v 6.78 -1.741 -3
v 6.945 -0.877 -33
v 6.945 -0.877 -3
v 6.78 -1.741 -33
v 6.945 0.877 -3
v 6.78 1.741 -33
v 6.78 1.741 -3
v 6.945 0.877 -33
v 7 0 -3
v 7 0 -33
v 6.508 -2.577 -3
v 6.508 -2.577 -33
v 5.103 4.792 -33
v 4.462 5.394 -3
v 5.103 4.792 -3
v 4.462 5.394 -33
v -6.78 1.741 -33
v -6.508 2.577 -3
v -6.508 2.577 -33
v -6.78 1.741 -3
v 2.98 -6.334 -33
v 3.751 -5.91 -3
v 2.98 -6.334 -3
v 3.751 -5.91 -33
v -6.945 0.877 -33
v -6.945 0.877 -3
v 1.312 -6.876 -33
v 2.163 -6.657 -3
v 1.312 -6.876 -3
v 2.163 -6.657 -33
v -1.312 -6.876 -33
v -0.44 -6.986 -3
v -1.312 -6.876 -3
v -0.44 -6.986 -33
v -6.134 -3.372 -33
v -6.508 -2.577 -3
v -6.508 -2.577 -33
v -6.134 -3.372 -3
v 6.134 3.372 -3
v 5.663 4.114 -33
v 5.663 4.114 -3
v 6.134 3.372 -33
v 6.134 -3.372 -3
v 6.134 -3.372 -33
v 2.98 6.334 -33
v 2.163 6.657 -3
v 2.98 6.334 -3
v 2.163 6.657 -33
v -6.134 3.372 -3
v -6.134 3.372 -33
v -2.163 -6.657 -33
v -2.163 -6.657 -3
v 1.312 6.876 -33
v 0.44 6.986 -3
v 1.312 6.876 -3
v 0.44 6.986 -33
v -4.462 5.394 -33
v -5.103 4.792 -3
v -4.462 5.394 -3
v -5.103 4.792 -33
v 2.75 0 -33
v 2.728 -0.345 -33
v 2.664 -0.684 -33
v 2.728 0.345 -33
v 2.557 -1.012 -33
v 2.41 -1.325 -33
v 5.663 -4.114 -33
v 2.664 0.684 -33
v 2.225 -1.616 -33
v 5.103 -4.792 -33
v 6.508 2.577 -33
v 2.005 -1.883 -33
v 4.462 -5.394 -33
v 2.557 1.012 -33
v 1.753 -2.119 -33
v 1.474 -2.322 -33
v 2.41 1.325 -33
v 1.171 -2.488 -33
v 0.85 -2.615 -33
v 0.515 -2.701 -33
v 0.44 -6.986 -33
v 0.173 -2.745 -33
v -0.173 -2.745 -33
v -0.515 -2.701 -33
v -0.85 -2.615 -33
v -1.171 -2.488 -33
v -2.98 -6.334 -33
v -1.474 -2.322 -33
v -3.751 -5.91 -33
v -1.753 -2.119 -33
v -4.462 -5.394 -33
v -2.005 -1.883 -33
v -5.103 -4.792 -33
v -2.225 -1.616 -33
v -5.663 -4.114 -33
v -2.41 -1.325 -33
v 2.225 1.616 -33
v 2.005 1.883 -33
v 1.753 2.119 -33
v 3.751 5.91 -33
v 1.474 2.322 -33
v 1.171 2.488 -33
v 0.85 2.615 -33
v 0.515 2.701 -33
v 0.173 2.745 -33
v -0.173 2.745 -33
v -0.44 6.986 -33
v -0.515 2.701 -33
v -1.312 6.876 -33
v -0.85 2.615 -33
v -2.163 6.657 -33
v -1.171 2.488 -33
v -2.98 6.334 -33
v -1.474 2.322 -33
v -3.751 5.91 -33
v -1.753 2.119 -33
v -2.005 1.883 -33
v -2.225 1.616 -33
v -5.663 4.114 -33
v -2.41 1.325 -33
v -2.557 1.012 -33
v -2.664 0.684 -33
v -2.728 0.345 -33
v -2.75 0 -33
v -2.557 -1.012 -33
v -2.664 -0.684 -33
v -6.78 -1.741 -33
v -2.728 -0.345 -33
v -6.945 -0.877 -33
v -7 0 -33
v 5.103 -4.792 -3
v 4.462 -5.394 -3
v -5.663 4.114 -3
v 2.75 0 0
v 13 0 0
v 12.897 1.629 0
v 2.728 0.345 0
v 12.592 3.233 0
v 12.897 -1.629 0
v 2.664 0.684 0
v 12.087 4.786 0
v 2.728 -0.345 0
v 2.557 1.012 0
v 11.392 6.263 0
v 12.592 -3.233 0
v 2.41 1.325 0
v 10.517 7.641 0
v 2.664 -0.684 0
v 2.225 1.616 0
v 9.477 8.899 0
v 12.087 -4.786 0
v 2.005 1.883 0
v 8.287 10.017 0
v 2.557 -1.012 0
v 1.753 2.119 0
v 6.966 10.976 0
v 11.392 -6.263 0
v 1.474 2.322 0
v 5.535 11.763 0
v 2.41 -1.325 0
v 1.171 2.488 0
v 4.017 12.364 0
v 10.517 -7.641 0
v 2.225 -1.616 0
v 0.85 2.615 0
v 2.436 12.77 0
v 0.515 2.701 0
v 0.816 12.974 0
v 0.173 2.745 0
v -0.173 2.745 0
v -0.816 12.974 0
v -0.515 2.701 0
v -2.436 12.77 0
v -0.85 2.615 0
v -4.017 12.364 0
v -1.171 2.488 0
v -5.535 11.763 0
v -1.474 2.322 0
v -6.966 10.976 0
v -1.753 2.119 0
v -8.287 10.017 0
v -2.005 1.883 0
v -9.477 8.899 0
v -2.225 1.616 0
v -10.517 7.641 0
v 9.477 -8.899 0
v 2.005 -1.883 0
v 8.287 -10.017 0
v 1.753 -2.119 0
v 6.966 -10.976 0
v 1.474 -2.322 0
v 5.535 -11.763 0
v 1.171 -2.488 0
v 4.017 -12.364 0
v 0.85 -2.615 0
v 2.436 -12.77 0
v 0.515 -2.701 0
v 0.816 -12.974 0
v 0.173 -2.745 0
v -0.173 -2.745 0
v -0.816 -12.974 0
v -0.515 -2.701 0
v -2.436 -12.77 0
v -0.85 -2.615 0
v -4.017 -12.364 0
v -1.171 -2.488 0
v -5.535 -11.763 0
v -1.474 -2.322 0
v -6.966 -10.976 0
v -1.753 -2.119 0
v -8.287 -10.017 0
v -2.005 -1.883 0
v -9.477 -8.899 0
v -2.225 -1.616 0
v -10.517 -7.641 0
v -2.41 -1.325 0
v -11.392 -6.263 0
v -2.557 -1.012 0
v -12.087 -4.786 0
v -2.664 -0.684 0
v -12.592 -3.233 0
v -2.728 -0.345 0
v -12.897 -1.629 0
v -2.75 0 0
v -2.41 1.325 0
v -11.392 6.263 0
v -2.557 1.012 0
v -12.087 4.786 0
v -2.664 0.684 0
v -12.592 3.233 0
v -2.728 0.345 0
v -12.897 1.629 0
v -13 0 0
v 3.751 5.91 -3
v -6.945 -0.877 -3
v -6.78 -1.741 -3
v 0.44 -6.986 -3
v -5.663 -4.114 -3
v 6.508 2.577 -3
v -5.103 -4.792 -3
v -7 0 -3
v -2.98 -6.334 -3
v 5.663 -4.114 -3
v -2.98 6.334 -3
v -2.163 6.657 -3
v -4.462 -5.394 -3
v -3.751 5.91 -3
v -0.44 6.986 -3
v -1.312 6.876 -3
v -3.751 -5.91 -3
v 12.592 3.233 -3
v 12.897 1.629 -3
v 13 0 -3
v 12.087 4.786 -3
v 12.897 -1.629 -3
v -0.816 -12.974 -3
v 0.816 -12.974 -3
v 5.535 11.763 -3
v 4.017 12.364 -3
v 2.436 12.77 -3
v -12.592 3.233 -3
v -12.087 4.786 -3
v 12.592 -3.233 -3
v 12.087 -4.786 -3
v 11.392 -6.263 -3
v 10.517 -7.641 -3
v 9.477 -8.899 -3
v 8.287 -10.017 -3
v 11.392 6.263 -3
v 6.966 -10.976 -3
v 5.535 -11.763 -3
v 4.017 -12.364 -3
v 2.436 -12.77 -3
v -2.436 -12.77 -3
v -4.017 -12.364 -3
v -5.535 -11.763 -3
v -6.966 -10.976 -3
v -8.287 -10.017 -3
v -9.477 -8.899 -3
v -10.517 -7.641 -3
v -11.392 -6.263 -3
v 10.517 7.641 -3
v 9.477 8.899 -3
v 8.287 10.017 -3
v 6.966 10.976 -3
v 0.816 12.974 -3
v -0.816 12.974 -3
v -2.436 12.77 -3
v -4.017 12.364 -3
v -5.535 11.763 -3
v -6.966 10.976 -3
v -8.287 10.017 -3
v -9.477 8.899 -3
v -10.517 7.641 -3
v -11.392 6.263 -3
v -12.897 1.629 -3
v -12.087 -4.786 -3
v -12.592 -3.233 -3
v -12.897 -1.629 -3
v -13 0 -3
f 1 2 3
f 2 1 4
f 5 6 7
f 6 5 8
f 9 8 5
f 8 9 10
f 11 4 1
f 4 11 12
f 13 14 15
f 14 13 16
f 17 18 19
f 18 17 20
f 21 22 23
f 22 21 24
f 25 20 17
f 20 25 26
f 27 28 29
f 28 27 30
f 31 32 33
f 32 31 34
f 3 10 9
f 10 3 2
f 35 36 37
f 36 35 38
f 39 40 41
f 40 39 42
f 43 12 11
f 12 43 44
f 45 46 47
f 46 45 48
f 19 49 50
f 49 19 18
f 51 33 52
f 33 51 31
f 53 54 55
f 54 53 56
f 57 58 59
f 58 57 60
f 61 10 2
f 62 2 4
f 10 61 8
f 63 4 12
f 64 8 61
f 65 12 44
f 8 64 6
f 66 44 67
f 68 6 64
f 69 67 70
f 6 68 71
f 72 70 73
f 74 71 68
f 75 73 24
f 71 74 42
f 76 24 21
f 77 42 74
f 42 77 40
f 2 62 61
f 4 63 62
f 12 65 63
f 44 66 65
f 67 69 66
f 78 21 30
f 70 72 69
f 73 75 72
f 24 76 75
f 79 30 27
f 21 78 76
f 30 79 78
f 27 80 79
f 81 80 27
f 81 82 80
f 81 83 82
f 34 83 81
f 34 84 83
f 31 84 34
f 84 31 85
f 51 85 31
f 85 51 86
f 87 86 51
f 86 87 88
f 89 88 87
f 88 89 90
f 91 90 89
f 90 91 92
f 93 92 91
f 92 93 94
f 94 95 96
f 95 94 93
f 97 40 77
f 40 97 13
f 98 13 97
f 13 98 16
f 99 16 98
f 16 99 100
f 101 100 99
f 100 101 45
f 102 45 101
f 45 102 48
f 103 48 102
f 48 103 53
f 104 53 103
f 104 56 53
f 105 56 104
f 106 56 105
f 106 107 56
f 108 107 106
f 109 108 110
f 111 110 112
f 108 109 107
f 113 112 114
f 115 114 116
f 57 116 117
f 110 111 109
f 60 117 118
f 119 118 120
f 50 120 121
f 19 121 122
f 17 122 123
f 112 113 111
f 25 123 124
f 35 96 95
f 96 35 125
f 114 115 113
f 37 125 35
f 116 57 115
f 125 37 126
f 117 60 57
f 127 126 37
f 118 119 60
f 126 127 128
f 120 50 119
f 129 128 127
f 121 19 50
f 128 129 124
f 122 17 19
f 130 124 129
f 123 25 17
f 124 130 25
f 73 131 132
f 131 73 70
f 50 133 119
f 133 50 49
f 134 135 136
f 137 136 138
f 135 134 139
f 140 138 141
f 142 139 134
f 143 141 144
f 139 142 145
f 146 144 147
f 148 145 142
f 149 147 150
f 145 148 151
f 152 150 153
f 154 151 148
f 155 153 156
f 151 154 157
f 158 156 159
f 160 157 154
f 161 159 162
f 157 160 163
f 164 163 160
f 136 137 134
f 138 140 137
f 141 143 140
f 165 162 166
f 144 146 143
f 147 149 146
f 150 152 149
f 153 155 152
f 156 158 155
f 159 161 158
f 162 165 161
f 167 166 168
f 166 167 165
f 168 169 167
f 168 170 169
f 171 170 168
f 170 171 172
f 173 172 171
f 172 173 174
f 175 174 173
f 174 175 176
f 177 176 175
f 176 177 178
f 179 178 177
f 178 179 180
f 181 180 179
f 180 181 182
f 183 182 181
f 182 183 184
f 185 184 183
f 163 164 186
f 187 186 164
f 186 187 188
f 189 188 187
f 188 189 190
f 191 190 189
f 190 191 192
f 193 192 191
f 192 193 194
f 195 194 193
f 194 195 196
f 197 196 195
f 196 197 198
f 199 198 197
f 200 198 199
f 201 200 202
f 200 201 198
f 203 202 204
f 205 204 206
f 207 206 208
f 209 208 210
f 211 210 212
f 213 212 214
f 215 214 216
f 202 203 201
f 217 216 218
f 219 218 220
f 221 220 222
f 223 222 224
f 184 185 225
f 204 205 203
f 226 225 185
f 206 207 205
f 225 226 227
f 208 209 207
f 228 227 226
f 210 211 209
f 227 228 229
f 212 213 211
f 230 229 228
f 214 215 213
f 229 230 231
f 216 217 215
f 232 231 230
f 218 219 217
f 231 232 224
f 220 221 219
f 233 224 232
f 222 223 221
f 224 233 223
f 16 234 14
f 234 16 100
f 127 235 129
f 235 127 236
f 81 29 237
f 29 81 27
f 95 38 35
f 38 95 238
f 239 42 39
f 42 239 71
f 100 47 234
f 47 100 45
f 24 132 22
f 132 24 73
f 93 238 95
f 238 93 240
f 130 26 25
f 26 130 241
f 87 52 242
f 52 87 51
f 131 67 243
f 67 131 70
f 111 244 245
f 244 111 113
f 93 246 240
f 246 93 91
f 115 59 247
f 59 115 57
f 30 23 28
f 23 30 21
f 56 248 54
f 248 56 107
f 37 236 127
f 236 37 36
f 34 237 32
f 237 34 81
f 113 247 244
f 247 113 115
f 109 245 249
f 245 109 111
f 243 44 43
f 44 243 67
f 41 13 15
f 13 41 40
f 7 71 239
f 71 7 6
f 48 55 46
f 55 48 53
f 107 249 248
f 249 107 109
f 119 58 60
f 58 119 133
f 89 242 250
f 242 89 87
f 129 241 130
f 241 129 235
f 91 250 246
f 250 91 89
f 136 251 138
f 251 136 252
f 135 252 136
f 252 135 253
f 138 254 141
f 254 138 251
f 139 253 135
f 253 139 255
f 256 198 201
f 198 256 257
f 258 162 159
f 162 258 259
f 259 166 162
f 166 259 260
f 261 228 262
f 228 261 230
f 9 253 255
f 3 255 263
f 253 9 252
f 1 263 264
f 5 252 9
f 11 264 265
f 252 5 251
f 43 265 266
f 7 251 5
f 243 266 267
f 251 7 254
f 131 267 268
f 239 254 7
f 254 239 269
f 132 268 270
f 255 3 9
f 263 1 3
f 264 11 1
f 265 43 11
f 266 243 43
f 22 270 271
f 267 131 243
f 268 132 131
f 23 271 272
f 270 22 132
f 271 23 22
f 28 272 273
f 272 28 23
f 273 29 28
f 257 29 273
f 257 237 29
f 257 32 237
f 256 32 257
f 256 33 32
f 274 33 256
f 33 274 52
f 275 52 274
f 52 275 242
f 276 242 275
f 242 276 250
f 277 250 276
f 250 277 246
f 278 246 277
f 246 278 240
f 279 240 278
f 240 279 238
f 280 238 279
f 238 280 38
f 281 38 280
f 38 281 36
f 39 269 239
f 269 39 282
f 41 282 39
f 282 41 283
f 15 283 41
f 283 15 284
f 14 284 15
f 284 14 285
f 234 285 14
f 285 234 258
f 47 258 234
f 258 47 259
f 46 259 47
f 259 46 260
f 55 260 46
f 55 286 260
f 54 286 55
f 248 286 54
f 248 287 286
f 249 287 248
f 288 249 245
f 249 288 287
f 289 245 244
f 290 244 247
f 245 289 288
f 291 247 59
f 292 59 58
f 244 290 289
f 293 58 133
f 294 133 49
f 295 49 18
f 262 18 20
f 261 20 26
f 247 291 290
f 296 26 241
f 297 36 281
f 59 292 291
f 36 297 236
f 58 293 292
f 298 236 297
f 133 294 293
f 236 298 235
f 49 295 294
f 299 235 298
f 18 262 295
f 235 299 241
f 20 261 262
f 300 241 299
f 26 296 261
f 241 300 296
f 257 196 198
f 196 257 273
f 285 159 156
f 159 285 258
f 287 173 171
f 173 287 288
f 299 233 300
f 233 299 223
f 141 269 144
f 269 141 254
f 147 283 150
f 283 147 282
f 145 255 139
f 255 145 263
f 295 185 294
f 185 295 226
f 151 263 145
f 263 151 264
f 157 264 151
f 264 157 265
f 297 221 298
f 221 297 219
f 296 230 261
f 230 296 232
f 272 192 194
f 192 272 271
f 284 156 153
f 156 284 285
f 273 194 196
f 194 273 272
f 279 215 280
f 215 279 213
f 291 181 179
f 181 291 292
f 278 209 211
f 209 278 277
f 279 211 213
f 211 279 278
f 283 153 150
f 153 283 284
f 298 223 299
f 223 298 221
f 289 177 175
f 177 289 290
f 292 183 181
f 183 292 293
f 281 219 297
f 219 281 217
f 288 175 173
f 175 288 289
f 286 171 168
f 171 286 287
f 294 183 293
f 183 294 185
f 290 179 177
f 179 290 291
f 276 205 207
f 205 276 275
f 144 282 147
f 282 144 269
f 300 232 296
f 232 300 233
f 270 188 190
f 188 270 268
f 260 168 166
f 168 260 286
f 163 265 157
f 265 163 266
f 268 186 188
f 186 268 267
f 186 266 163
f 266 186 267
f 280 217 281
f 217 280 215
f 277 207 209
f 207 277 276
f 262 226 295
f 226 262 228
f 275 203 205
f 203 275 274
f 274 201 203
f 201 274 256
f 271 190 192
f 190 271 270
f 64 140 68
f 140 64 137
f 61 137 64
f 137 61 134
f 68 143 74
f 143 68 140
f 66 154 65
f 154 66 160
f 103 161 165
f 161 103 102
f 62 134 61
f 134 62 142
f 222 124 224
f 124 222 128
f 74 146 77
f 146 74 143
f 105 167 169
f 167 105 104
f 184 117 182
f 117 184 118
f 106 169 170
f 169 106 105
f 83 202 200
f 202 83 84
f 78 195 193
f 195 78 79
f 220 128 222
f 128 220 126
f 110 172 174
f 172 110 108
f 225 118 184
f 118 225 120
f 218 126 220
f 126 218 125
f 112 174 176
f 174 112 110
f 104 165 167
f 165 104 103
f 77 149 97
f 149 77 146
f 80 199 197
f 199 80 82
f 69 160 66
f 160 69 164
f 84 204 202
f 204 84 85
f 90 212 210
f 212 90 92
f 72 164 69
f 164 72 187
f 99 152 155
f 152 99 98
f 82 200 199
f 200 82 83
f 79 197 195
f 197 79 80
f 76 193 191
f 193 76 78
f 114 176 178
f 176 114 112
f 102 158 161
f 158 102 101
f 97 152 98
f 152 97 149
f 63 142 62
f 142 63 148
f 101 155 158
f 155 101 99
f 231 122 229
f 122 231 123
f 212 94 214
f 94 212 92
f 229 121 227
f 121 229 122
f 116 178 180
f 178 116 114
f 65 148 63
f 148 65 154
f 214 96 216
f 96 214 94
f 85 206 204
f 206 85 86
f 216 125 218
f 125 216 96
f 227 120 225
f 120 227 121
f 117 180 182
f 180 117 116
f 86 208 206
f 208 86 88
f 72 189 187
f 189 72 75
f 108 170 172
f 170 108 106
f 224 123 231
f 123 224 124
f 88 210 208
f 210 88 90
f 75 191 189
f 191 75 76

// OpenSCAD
$fn = 50;


difference() {
	union() {
		translate(v = [0, 0, -33.0000000000]) {
			cylinder(h = 33, r = 7.0000000000);
		}
		translate(v = [0, 0, -3.0000000000]) {
			cylinder(h = 3, r = 13.0000000000);
		}
	}
	union() {
		#translate(v = [0, 0, -33]) {
			cylinder(h = 33, r = 2.7500000000);
		}
	}
}
